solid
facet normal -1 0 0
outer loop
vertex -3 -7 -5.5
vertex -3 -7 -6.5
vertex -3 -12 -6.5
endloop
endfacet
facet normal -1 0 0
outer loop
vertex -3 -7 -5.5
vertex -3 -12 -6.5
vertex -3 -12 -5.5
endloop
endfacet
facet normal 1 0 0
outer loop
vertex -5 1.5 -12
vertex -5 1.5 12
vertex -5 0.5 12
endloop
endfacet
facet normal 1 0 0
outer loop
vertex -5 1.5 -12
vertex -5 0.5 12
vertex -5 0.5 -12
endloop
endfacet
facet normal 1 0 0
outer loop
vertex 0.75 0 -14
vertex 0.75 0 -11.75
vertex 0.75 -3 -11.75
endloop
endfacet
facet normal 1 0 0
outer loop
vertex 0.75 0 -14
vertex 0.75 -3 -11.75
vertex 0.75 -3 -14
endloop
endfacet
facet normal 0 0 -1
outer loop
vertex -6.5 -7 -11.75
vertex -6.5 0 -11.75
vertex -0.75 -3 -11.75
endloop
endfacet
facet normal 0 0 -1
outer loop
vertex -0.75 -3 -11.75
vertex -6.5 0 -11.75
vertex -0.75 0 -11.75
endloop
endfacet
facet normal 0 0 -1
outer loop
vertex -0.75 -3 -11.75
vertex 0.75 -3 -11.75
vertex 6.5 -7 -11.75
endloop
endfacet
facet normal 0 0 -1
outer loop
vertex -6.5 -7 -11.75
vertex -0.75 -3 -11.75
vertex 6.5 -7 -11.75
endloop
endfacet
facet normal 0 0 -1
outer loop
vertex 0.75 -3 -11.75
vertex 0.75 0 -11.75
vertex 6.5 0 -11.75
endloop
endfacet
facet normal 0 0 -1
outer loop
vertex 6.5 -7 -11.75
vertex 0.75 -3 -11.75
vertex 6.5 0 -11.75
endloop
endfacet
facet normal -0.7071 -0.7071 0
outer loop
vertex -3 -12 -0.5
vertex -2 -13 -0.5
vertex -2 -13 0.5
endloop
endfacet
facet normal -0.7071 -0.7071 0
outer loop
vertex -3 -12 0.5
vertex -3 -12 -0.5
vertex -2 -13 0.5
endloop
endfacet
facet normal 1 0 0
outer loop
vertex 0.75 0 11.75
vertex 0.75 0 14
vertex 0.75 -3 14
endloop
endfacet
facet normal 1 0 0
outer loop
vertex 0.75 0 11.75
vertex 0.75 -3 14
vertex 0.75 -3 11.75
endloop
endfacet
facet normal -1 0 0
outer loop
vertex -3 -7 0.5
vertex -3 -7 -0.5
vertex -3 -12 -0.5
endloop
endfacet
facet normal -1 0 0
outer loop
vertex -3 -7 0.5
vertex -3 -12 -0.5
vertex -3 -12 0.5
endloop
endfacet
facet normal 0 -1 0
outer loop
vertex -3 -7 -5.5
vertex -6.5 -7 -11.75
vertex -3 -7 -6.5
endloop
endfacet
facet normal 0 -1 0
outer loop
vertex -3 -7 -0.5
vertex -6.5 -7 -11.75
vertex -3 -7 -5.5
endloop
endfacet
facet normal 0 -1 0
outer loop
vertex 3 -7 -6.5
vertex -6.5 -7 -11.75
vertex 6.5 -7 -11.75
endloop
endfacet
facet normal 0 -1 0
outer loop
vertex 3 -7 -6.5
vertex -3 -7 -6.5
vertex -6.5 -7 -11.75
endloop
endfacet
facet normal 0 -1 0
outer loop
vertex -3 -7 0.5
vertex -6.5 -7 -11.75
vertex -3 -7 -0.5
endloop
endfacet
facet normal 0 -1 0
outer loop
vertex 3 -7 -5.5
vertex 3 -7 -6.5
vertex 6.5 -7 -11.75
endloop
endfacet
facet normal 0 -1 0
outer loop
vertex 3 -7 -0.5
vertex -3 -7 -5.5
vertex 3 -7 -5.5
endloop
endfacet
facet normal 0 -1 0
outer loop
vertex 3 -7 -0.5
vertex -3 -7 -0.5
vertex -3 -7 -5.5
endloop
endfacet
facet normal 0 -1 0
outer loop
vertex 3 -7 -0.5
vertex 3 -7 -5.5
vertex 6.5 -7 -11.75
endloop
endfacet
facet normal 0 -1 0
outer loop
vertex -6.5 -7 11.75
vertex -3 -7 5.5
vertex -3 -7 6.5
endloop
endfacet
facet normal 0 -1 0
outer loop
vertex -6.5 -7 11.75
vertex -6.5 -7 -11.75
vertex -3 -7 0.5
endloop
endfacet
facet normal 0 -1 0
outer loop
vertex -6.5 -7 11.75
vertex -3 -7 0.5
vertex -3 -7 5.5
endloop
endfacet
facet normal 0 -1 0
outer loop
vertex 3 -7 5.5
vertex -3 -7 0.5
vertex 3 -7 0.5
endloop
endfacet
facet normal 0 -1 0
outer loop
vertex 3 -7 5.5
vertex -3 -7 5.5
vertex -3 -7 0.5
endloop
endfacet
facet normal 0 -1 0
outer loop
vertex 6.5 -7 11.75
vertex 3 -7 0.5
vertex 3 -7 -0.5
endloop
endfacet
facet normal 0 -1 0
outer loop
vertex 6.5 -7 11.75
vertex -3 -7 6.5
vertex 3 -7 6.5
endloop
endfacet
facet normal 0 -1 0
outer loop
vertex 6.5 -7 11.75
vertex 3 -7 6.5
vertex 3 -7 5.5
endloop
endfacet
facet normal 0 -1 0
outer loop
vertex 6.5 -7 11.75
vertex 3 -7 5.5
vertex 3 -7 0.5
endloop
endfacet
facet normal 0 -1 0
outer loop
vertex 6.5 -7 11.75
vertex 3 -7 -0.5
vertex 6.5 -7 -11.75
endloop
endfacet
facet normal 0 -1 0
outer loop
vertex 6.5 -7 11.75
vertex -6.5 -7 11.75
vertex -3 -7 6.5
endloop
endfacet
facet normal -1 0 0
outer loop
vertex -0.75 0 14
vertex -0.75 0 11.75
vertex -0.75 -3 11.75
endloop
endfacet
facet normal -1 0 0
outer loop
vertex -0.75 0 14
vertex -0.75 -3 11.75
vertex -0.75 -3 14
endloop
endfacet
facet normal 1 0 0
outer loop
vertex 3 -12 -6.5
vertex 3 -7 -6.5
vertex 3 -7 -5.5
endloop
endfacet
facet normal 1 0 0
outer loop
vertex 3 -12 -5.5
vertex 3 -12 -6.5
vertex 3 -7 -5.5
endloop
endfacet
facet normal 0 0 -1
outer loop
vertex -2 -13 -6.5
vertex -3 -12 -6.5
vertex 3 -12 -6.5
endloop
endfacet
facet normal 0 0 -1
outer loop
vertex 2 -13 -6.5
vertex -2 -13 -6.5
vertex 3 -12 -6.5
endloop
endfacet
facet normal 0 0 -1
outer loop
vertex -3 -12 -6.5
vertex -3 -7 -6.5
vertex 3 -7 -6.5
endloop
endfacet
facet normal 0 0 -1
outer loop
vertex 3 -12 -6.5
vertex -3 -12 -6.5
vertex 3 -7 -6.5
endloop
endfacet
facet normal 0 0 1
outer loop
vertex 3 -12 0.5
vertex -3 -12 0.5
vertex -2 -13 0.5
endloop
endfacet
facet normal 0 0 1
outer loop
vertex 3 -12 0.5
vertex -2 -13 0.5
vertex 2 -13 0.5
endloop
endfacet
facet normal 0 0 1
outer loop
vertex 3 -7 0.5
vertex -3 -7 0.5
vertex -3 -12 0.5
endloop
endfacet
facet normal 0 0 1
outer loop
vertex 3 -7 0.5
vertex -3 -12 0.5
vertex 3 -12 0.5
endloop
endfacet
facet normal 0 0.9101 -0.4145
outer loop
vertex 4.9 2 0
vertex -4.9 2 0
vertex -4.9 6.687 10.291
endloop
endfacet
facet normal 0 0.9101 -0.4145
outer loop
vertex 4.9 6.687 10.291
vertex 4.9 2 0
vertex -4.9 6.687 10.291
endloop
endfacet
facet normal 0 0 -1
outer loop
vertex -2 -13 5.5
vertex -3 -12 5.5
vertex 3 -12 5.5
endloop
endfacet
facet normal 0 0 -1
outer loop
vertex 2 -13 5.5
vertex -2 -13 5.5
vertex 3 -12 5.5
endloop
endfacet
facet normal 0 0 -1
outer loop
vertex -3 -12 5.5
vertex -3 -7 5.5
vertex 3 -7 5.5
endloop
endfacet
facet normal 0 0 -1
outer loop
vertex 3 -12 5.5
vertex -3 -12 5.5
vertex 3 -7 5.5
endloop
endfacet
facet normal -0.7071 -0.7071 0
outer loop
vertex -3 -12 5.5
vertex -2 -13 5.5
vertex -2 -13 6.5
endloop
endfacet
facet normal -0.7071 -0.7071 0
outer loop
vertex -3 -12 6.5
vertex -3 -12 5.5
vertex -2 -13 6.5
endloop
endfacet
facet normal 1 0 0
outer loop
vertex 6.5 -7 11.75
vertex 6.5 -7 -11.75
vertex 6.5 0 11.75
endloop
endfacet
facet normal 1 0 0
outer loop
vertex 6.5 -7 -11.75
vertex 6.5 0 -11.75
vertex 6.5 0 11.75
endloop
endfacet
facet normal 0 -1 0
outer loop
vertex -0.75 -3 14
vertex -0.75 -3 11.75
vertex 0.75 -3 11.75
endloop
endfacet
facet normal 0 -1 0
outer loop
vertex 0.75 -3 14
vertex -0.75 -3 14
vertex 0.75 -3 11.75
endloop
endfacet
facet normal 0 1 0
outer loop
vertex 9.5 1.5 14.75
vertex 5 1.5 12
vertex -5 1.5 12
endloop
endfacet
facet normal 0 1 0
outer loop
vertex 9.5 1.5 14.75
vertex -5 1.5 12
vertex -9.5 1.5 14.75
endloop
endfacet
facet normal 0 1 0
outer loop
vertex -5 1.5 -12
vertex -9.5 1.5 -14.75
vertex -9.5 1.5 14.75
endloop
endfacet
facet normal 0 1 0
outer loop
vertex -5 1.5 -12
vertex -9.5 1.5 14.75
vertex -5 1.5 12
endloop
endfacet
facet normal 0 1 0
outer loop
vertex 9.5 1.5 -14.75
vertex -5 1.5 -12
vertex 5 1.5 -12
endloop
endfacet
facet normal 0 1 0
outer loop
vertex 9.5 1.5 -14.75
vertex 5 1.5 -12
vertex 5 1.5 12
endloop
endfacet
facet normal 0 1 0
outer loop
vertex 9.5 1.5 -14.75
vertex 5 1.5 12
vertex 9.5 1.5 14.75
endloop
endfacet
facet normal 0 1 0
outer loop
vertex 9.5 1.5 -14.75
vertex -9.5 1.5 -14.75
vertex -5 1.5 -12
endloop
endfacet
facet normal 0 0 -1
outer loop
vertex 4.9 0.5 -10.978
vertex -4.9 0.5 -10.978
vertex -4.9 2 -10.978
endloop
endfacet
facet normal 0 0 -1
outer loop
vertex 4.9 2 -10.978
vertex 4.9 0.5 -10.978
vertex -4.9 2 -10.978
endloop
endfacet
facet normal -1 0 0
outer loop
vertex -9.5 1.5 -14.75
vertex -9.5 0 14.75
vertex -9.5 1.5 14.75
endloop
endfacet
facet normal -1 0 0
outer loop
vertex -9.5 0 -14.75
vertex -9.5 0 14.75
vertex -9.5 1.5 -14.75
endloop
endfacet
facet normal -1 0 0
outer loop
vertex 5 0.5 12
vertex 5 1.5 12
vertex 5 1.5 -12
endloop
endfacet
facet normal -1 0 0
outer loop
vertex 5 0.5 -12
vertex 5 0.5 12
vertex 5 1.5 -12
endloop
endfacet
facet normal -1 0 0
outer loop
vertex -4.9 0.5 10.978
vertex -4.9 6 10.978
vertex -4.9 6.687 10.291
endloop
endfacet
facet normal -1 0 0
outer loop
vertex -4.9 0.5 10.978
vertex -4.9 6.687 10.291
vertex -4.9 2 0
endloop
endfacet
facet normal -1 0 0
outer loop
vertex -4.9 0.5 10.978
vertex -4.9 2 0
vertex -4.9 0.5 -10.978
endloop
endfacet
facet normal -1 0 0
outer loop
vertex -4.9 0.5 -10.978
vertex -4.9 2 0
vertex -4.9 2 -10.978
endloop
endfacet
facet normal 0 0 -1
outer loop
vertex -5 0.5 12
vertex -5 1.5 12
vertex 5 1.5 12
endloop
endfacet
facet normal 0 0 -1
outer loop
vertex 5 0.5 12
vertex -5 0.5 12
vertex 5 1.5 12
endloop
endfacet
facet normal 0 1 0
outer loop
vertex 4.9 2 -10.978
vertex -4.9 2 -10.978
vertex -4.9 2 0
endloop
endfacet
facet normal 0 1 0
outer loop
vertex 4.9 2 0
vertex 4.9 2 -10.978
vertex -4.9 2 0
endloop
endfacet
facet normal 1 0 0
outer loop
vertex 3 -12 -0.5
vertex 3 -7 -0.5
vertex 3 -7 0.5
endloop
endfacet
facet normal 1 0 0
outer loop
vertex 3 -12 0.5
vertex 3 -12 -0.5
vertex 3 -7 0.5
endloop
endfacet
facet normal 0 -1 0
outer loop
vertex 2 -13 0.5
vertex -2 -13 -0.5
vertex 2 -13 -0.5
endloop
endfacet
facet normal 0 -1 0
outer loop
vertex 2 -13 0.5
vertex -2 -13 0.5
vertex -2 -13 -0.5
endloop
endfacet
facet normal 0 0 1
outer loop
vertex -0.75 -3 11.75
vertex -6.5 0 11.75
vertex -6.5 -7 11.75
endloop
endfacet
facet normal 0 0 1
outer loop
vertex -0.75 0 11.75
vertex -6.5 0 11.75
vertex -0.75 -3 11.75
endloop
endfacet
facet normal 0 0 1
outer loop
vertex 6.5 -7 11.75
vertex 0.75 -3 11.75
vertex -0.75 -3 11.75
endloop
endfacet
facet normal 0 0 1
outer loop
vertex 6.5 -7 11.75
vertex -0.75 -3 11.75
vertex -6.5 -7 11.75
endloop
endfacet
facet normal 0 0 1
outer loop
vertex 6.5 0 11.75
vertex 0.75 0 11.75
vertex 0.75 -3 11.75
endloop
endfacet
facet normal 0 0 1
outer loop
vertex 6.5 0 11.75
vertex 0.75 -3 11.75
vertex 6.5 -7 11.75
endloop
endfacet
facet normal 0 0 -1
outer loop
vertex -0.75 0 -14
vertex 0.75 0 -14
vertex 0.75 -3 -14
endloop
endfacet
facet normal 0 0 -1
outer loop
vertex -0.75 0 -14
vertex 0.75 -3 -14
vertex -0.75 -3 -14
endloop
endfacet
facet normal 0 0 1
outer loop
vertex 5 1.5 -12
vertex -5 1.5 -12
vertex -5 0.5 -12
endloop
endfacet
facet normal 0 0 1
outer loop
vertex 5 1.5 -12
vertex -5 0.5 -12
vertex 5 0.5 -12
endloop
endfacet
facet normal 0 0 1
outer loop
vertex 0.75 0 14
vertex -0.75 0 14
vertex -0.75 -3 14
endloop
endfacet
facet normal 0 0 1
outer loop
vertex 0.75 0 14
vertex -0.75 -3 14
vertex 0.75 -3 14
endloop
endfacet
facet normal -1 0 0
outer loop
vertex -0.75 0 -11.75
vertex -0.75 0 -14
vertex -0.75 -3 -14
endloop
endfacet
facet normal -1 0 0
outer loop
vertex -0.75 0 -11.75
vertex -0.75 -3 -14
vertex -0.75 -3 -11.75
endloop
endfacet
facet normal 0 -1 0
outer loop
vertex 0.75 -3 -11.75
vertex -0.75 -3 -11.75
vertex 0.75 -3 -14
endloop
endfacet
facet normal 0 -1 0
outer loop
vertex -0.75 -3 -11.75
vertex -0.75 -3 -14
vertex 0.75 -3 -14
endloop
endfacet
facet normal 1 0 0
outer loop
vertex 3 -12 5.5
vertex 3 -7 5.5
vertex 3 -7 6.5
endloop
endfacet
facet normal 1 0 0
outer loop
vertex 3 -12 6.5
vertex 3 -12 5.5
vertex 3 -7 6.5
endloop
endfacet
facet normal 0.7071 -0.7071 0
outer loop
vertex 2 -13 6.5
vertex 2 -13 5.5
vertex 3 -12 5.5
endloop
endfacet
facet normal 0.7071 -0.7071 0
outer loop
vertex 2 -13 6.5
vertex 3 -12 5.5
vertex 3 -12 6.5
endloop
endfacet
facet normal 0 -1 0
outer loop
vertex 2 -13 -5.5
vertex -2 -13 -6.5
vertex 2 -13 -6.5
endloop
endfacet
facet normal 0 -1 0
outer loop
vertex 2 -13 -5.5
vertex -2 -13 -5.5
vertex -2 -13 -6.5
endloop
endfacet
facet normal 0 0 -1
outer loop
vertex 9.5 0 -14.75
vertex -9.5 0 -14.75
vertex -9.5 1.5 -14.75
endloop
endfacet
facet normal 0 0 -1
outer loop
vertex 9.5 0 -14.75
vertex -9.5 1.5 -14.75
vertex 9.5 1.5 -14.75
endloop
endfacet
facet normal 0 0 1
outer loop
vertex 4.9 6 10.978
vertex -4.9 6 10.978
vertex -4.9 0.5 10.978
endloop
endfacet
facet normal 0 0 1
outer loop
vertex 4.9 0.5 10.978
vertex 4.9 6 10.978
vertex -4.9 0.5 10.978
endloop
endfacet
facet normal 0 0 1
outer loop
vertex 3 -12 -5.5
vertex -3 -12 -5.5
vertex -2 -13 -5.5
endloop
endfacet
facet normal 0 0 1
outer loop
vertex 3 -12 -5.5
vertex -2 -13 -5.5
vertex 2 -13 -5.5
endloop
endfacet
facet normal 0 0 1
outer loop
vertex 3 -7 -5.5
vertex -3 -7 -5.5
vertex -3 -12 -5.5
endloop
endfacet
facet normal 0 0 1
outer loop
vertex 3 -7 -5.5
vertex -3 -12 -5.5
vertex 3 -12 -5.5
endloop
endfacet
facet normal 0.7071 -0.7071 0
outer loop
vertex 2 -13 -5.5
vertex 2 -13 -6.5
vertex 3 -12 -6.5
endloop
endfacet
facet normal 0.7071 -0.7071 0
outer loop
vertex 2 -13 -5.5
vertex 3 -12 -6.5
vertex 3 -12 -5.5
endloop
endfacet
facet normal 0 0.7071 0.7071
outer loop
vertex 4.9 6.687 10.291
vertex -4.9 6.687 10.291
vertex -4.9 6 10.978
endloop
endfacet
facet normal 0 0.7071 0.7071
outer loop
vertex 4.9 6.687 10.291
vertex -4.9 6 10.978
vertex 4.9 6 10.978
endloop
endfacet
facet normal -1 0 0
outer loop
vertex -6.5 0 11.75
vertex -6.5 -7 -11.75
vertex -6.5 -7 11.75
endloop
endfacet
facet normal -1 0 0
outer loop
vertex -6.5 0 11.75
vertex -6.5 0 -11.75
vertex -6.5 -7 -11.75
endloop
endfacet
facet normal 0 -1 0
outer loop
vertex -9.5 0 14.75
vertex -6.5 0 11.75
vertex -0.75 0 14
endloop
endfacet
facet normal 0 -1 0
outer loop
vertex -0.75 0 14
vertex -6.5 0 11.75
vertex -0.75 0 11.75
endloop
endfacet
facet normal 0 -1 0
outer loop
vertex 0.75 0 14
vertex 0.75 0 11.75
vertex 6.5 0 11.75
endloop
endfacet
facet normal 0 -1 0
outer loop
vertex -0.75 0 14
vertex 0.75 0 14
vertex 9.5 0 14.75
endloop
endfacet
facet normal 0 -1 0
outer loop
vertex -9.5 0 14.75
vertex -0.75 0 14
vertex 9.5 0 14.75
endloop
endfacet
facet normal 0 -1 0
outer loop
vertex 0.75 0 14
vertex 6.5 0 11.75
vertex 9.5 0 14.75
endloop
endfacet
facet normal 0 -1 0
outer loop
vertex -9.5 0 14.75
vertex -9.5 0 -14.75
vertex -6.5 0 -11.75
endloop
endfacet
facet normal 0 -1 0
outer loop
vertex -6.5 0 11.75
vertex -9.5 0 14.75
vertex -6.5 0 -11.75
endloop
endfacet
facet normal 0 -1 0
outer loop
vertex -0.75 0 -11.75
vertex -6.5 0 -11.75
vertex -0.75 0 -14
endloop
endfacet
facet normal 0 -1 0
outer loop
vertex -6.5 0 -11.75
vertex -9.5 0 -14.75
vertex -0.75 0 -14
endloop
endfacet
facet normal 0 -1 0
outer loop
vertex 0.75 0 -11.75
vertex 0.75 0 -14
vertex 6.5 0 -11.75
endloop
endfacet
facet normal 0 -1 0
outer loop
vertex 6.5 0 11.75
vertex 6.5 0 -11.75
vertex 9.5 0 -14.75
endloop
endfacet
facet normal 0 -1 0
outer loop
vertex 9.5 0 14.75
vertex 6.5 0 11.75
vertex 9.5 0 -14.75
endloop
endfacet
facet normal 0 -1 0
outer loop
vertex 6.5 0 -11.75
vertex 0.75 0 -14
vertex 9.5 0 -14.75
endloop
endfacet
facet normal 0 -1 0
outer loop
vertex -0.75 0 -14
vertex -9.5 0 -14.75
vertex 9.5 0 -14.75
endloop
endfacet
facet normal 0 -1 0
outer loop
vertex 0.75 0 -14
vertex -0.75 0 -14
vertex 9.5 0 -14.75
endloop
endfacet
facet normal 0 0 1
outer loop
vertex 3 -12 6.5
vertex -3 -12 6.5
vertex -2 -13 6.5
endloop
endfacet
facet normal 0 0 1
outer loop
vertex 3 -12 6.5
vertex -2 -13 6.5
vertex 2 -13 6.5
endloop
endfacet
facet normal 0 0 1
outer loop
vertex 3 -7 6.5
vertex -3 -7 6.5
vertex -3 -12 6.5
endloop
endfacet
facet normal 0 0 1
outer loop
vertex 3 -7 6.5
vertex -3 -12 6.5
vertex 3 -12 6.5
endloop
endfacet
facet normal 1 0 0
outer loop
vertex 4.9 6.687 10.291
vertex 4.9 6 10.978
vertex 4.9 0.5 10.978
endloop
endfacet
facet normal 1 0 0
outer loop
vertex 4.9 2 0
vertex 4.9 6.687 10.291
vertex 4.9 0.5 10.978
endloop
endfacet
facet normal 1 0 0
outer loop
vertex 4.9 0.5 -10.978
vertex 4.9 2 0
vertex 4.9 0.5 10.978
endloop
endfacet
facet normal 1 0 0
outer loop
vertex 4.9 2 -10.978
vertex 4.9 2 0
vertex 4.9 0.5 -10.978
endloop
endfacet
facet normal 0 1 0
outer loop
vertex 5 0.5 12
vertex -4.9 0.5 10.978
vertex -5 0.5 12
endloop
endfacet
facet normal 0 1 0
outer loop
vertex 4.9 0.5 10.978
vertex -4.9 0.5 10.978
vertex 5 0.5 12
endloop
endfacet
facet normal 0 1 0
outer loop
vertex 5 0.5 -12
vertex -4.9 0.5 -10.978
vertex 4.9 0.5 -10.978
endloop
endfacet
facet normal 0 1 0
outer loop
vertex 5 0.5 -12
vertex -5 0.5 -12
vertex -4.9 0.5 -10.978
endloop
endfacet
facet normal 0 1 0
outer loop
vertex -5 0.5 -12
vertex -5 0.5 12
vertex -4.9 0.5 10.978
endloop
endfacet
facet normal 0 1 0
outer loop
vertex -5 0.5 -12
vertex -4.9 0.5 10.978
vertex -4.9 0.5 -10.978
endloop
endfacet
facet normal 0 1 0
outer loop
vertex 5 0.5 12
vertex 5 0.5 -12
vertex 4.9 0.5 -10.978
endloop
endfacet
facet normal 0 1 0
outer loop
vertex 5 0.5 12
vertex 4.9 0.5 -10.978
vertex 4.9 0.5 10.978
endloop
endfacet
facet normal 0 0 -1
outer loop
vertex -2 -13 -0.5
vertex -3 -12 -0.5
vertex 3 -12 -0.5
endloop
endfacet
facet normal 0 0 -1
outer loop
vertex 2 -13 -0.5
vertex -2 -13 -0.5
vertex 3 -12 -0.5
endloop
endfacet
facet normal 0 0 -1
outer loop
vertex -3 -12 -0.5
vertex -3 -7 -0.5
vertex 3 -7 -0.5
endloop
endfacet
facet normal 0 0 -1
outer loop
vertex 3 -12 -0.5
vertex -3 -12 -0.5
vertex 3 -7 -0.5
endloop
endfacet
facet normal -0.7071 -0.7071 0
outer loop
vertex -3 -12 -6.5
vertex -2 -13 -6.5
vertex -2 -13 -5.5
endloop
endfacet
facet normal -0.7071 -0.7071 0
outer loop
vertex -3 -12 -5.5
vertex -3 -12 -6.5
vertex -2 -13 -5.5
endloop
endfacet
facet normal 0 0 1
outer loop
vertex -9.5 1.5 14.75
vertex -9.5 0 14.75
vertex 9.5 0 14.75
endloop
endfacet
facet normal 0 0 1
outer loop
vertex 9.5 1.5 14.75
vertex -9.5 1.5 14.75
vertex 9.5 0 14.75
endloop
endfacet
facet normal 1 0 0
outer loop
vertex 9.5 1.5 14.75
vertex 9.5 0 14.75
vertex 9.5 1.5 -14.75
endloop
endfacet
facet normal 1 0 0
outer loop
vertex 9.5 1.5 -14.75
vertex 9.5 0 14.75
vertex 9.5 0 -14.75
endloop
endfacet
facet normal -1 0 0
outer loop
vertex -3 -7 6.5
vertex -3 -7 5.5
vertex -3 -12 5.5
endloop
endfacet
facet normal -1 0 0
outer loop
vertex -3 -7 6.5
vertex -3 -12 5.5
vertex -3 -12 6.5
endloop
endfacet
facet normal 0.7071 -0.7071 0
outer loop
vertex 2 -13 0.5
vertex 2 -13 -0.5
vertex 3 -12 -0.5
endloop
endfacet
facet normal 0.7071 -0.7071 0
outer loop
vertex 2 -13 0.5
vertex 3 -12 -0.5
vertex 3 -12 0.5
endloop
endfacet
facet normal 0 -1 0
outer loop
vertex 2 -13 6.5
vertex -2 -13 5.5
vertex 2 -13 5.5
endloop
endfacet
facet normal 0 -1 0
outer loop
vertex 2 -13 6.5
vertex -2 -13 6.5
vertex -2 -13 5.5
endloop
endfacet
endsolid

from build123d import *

# Parameters (mm, degrees)
BOSS_EXTRUDE1_DEPTH      = 3
SKETCH2_W                = 13
SKETCH2_H                = 23.5
BOSS_EXTRUDE2_DEPTH      = 4
SKETCH3_W                = 6
SKETCH3_H                = 1
BOSS_EXTRUDE3_DEPTH      = 6
CHAMFER1_SIZE            = 1
SKETCH4_W                = 19
SKETCH4_H                = 29.5
BOSS_EXTRUDE4_DEPTH      = 1.5
SKETCH5_W                = 10
SKETCH5_H                = 24
CUT_EXTRUDE1_DEPTH       = 1
BOSS_EXTRUDE5_DEPTH      = 4.9
BOSS_EXTRUDE5_DEPTH_BACK = 4.9
CHAMFER2_SIZE            = 1
CHAMFER2_SIZE2           = 0.754975442


with BuildPart() as part:
    # Sketch1 → Boss-Extrude1 (new body)
    with BuildSketch(Plane(origin=(0, 0, 0), x_dir=(1, 0, 0), z_dir=(0, 1, 0))):
        Polygon((0.75, -11.75), (6.5, -11.75), (6.5, 11.75), (0.75, 11.75), (0.75, 14), (-0.75, 14), (-0.75, 11.75), (-6.5, 11.75), (-6.5, -11.75), (-0.75, -11.75), (-0.75, -14), (0.75, -14), align=None)
    extrude(amount=-BOSS_EXTRUDE1_DEPTH)

    # Sketch2 → Boss-Extrude2 (add)
    with BuildSketch(Plane.XZ.offset(3)):
        Rectangle(SKETCH2_W, SKETCH2_H)
    extrude(amount=BOSS_EXTRUDE2_DEPTH)

    # Sketch3 → Boss-Extrude3 (add)
    with BuildSketch(Plane.XZ.offset(7)):
        Rectangle(SKETCH3_W, SKETCH3_H)
        with Locations((0, 6)):
            Rectangle(SKETCH3_W, SKETCH3_H)
        with Locations((0, -6)):
            Rectangle(SKETCH3_W, SKETCH3_H)
    extrude(amount=BOSS_EXTRUDE3_DEPTH)

    # Chamfer1
    chamfer1_edges = [part.edges().sort_by_distance(p)[0] for p in [
        (-3, -13, 0),
        (3, -13, 0),
        (-3, -13, 6),
        (3, -13, 6),
        (3, -13, -6),
        (-3, -13, -6),
    ]]
    chamfer(chamfer1_edges, length=CHAMFER1_SIZE)

    # Sketch4 → Boss-Extrude4 (add)
    with BuildSketch(Plane(origin=(0, 0, 0), x_dir=(1, 0, 0), z_dir=(0, 1, 0))):
        Rectangle(SKETCH4_W, SKETCH4_H)
    extrude(amount=BOSS_EXTRUDE4_DEPTH)

    # Sketch5 → Cut-Extrude1 (cut)
    with BuildSketch(Plane(origin=(0, 1.5, 0), x_dir=(1, 0, 0), z_dir=(0, 1, 0))):
        Rectangle(SKETCH5_W, SKETCH5_H)
    extrude(amount=-CUT_EXTRUDE1_DEPTH, mode=Mode.SUBTRACT)

    # Sketch6 → Boss-Extrude5 (add, two sides: drawn at the far end of the back side and taken through both)
    with BuildSketch(Plane(origin=(0, 0, 0), x_dir=(0, 0, -1), z_dir=(1, 0, 0)).offset(-BOSS_EXTRUDE5_DEPTH_BACK)):
        Polygon((-10.977846987, 0), (10.977846987, 0), (10.977846987, 2), (0, 2), (-10.977846987, 7), align=None)
    extrude(amount=BOSS_EXTRUDE5_DEPTH + BOSS_EXTRUDE5_DEPTH_BACK)

    # Chamfer2
    chamfer2_edges = [part.edges().sort_by_distance(p)[0] for p in [
        (0, 7, 10.977846987),
    ]]
    chamfer2_side = [part.faces().sort_by_distance(p)[0] for p in [
        (0, 3.75, 10.977846987),
    ]]
    chamfer(chamfer2_edges, length=CHAMFER2_SIZE, length2=CHAMFER2_SIZE2, reference=chamfer2_side[0])


solid = part.part
